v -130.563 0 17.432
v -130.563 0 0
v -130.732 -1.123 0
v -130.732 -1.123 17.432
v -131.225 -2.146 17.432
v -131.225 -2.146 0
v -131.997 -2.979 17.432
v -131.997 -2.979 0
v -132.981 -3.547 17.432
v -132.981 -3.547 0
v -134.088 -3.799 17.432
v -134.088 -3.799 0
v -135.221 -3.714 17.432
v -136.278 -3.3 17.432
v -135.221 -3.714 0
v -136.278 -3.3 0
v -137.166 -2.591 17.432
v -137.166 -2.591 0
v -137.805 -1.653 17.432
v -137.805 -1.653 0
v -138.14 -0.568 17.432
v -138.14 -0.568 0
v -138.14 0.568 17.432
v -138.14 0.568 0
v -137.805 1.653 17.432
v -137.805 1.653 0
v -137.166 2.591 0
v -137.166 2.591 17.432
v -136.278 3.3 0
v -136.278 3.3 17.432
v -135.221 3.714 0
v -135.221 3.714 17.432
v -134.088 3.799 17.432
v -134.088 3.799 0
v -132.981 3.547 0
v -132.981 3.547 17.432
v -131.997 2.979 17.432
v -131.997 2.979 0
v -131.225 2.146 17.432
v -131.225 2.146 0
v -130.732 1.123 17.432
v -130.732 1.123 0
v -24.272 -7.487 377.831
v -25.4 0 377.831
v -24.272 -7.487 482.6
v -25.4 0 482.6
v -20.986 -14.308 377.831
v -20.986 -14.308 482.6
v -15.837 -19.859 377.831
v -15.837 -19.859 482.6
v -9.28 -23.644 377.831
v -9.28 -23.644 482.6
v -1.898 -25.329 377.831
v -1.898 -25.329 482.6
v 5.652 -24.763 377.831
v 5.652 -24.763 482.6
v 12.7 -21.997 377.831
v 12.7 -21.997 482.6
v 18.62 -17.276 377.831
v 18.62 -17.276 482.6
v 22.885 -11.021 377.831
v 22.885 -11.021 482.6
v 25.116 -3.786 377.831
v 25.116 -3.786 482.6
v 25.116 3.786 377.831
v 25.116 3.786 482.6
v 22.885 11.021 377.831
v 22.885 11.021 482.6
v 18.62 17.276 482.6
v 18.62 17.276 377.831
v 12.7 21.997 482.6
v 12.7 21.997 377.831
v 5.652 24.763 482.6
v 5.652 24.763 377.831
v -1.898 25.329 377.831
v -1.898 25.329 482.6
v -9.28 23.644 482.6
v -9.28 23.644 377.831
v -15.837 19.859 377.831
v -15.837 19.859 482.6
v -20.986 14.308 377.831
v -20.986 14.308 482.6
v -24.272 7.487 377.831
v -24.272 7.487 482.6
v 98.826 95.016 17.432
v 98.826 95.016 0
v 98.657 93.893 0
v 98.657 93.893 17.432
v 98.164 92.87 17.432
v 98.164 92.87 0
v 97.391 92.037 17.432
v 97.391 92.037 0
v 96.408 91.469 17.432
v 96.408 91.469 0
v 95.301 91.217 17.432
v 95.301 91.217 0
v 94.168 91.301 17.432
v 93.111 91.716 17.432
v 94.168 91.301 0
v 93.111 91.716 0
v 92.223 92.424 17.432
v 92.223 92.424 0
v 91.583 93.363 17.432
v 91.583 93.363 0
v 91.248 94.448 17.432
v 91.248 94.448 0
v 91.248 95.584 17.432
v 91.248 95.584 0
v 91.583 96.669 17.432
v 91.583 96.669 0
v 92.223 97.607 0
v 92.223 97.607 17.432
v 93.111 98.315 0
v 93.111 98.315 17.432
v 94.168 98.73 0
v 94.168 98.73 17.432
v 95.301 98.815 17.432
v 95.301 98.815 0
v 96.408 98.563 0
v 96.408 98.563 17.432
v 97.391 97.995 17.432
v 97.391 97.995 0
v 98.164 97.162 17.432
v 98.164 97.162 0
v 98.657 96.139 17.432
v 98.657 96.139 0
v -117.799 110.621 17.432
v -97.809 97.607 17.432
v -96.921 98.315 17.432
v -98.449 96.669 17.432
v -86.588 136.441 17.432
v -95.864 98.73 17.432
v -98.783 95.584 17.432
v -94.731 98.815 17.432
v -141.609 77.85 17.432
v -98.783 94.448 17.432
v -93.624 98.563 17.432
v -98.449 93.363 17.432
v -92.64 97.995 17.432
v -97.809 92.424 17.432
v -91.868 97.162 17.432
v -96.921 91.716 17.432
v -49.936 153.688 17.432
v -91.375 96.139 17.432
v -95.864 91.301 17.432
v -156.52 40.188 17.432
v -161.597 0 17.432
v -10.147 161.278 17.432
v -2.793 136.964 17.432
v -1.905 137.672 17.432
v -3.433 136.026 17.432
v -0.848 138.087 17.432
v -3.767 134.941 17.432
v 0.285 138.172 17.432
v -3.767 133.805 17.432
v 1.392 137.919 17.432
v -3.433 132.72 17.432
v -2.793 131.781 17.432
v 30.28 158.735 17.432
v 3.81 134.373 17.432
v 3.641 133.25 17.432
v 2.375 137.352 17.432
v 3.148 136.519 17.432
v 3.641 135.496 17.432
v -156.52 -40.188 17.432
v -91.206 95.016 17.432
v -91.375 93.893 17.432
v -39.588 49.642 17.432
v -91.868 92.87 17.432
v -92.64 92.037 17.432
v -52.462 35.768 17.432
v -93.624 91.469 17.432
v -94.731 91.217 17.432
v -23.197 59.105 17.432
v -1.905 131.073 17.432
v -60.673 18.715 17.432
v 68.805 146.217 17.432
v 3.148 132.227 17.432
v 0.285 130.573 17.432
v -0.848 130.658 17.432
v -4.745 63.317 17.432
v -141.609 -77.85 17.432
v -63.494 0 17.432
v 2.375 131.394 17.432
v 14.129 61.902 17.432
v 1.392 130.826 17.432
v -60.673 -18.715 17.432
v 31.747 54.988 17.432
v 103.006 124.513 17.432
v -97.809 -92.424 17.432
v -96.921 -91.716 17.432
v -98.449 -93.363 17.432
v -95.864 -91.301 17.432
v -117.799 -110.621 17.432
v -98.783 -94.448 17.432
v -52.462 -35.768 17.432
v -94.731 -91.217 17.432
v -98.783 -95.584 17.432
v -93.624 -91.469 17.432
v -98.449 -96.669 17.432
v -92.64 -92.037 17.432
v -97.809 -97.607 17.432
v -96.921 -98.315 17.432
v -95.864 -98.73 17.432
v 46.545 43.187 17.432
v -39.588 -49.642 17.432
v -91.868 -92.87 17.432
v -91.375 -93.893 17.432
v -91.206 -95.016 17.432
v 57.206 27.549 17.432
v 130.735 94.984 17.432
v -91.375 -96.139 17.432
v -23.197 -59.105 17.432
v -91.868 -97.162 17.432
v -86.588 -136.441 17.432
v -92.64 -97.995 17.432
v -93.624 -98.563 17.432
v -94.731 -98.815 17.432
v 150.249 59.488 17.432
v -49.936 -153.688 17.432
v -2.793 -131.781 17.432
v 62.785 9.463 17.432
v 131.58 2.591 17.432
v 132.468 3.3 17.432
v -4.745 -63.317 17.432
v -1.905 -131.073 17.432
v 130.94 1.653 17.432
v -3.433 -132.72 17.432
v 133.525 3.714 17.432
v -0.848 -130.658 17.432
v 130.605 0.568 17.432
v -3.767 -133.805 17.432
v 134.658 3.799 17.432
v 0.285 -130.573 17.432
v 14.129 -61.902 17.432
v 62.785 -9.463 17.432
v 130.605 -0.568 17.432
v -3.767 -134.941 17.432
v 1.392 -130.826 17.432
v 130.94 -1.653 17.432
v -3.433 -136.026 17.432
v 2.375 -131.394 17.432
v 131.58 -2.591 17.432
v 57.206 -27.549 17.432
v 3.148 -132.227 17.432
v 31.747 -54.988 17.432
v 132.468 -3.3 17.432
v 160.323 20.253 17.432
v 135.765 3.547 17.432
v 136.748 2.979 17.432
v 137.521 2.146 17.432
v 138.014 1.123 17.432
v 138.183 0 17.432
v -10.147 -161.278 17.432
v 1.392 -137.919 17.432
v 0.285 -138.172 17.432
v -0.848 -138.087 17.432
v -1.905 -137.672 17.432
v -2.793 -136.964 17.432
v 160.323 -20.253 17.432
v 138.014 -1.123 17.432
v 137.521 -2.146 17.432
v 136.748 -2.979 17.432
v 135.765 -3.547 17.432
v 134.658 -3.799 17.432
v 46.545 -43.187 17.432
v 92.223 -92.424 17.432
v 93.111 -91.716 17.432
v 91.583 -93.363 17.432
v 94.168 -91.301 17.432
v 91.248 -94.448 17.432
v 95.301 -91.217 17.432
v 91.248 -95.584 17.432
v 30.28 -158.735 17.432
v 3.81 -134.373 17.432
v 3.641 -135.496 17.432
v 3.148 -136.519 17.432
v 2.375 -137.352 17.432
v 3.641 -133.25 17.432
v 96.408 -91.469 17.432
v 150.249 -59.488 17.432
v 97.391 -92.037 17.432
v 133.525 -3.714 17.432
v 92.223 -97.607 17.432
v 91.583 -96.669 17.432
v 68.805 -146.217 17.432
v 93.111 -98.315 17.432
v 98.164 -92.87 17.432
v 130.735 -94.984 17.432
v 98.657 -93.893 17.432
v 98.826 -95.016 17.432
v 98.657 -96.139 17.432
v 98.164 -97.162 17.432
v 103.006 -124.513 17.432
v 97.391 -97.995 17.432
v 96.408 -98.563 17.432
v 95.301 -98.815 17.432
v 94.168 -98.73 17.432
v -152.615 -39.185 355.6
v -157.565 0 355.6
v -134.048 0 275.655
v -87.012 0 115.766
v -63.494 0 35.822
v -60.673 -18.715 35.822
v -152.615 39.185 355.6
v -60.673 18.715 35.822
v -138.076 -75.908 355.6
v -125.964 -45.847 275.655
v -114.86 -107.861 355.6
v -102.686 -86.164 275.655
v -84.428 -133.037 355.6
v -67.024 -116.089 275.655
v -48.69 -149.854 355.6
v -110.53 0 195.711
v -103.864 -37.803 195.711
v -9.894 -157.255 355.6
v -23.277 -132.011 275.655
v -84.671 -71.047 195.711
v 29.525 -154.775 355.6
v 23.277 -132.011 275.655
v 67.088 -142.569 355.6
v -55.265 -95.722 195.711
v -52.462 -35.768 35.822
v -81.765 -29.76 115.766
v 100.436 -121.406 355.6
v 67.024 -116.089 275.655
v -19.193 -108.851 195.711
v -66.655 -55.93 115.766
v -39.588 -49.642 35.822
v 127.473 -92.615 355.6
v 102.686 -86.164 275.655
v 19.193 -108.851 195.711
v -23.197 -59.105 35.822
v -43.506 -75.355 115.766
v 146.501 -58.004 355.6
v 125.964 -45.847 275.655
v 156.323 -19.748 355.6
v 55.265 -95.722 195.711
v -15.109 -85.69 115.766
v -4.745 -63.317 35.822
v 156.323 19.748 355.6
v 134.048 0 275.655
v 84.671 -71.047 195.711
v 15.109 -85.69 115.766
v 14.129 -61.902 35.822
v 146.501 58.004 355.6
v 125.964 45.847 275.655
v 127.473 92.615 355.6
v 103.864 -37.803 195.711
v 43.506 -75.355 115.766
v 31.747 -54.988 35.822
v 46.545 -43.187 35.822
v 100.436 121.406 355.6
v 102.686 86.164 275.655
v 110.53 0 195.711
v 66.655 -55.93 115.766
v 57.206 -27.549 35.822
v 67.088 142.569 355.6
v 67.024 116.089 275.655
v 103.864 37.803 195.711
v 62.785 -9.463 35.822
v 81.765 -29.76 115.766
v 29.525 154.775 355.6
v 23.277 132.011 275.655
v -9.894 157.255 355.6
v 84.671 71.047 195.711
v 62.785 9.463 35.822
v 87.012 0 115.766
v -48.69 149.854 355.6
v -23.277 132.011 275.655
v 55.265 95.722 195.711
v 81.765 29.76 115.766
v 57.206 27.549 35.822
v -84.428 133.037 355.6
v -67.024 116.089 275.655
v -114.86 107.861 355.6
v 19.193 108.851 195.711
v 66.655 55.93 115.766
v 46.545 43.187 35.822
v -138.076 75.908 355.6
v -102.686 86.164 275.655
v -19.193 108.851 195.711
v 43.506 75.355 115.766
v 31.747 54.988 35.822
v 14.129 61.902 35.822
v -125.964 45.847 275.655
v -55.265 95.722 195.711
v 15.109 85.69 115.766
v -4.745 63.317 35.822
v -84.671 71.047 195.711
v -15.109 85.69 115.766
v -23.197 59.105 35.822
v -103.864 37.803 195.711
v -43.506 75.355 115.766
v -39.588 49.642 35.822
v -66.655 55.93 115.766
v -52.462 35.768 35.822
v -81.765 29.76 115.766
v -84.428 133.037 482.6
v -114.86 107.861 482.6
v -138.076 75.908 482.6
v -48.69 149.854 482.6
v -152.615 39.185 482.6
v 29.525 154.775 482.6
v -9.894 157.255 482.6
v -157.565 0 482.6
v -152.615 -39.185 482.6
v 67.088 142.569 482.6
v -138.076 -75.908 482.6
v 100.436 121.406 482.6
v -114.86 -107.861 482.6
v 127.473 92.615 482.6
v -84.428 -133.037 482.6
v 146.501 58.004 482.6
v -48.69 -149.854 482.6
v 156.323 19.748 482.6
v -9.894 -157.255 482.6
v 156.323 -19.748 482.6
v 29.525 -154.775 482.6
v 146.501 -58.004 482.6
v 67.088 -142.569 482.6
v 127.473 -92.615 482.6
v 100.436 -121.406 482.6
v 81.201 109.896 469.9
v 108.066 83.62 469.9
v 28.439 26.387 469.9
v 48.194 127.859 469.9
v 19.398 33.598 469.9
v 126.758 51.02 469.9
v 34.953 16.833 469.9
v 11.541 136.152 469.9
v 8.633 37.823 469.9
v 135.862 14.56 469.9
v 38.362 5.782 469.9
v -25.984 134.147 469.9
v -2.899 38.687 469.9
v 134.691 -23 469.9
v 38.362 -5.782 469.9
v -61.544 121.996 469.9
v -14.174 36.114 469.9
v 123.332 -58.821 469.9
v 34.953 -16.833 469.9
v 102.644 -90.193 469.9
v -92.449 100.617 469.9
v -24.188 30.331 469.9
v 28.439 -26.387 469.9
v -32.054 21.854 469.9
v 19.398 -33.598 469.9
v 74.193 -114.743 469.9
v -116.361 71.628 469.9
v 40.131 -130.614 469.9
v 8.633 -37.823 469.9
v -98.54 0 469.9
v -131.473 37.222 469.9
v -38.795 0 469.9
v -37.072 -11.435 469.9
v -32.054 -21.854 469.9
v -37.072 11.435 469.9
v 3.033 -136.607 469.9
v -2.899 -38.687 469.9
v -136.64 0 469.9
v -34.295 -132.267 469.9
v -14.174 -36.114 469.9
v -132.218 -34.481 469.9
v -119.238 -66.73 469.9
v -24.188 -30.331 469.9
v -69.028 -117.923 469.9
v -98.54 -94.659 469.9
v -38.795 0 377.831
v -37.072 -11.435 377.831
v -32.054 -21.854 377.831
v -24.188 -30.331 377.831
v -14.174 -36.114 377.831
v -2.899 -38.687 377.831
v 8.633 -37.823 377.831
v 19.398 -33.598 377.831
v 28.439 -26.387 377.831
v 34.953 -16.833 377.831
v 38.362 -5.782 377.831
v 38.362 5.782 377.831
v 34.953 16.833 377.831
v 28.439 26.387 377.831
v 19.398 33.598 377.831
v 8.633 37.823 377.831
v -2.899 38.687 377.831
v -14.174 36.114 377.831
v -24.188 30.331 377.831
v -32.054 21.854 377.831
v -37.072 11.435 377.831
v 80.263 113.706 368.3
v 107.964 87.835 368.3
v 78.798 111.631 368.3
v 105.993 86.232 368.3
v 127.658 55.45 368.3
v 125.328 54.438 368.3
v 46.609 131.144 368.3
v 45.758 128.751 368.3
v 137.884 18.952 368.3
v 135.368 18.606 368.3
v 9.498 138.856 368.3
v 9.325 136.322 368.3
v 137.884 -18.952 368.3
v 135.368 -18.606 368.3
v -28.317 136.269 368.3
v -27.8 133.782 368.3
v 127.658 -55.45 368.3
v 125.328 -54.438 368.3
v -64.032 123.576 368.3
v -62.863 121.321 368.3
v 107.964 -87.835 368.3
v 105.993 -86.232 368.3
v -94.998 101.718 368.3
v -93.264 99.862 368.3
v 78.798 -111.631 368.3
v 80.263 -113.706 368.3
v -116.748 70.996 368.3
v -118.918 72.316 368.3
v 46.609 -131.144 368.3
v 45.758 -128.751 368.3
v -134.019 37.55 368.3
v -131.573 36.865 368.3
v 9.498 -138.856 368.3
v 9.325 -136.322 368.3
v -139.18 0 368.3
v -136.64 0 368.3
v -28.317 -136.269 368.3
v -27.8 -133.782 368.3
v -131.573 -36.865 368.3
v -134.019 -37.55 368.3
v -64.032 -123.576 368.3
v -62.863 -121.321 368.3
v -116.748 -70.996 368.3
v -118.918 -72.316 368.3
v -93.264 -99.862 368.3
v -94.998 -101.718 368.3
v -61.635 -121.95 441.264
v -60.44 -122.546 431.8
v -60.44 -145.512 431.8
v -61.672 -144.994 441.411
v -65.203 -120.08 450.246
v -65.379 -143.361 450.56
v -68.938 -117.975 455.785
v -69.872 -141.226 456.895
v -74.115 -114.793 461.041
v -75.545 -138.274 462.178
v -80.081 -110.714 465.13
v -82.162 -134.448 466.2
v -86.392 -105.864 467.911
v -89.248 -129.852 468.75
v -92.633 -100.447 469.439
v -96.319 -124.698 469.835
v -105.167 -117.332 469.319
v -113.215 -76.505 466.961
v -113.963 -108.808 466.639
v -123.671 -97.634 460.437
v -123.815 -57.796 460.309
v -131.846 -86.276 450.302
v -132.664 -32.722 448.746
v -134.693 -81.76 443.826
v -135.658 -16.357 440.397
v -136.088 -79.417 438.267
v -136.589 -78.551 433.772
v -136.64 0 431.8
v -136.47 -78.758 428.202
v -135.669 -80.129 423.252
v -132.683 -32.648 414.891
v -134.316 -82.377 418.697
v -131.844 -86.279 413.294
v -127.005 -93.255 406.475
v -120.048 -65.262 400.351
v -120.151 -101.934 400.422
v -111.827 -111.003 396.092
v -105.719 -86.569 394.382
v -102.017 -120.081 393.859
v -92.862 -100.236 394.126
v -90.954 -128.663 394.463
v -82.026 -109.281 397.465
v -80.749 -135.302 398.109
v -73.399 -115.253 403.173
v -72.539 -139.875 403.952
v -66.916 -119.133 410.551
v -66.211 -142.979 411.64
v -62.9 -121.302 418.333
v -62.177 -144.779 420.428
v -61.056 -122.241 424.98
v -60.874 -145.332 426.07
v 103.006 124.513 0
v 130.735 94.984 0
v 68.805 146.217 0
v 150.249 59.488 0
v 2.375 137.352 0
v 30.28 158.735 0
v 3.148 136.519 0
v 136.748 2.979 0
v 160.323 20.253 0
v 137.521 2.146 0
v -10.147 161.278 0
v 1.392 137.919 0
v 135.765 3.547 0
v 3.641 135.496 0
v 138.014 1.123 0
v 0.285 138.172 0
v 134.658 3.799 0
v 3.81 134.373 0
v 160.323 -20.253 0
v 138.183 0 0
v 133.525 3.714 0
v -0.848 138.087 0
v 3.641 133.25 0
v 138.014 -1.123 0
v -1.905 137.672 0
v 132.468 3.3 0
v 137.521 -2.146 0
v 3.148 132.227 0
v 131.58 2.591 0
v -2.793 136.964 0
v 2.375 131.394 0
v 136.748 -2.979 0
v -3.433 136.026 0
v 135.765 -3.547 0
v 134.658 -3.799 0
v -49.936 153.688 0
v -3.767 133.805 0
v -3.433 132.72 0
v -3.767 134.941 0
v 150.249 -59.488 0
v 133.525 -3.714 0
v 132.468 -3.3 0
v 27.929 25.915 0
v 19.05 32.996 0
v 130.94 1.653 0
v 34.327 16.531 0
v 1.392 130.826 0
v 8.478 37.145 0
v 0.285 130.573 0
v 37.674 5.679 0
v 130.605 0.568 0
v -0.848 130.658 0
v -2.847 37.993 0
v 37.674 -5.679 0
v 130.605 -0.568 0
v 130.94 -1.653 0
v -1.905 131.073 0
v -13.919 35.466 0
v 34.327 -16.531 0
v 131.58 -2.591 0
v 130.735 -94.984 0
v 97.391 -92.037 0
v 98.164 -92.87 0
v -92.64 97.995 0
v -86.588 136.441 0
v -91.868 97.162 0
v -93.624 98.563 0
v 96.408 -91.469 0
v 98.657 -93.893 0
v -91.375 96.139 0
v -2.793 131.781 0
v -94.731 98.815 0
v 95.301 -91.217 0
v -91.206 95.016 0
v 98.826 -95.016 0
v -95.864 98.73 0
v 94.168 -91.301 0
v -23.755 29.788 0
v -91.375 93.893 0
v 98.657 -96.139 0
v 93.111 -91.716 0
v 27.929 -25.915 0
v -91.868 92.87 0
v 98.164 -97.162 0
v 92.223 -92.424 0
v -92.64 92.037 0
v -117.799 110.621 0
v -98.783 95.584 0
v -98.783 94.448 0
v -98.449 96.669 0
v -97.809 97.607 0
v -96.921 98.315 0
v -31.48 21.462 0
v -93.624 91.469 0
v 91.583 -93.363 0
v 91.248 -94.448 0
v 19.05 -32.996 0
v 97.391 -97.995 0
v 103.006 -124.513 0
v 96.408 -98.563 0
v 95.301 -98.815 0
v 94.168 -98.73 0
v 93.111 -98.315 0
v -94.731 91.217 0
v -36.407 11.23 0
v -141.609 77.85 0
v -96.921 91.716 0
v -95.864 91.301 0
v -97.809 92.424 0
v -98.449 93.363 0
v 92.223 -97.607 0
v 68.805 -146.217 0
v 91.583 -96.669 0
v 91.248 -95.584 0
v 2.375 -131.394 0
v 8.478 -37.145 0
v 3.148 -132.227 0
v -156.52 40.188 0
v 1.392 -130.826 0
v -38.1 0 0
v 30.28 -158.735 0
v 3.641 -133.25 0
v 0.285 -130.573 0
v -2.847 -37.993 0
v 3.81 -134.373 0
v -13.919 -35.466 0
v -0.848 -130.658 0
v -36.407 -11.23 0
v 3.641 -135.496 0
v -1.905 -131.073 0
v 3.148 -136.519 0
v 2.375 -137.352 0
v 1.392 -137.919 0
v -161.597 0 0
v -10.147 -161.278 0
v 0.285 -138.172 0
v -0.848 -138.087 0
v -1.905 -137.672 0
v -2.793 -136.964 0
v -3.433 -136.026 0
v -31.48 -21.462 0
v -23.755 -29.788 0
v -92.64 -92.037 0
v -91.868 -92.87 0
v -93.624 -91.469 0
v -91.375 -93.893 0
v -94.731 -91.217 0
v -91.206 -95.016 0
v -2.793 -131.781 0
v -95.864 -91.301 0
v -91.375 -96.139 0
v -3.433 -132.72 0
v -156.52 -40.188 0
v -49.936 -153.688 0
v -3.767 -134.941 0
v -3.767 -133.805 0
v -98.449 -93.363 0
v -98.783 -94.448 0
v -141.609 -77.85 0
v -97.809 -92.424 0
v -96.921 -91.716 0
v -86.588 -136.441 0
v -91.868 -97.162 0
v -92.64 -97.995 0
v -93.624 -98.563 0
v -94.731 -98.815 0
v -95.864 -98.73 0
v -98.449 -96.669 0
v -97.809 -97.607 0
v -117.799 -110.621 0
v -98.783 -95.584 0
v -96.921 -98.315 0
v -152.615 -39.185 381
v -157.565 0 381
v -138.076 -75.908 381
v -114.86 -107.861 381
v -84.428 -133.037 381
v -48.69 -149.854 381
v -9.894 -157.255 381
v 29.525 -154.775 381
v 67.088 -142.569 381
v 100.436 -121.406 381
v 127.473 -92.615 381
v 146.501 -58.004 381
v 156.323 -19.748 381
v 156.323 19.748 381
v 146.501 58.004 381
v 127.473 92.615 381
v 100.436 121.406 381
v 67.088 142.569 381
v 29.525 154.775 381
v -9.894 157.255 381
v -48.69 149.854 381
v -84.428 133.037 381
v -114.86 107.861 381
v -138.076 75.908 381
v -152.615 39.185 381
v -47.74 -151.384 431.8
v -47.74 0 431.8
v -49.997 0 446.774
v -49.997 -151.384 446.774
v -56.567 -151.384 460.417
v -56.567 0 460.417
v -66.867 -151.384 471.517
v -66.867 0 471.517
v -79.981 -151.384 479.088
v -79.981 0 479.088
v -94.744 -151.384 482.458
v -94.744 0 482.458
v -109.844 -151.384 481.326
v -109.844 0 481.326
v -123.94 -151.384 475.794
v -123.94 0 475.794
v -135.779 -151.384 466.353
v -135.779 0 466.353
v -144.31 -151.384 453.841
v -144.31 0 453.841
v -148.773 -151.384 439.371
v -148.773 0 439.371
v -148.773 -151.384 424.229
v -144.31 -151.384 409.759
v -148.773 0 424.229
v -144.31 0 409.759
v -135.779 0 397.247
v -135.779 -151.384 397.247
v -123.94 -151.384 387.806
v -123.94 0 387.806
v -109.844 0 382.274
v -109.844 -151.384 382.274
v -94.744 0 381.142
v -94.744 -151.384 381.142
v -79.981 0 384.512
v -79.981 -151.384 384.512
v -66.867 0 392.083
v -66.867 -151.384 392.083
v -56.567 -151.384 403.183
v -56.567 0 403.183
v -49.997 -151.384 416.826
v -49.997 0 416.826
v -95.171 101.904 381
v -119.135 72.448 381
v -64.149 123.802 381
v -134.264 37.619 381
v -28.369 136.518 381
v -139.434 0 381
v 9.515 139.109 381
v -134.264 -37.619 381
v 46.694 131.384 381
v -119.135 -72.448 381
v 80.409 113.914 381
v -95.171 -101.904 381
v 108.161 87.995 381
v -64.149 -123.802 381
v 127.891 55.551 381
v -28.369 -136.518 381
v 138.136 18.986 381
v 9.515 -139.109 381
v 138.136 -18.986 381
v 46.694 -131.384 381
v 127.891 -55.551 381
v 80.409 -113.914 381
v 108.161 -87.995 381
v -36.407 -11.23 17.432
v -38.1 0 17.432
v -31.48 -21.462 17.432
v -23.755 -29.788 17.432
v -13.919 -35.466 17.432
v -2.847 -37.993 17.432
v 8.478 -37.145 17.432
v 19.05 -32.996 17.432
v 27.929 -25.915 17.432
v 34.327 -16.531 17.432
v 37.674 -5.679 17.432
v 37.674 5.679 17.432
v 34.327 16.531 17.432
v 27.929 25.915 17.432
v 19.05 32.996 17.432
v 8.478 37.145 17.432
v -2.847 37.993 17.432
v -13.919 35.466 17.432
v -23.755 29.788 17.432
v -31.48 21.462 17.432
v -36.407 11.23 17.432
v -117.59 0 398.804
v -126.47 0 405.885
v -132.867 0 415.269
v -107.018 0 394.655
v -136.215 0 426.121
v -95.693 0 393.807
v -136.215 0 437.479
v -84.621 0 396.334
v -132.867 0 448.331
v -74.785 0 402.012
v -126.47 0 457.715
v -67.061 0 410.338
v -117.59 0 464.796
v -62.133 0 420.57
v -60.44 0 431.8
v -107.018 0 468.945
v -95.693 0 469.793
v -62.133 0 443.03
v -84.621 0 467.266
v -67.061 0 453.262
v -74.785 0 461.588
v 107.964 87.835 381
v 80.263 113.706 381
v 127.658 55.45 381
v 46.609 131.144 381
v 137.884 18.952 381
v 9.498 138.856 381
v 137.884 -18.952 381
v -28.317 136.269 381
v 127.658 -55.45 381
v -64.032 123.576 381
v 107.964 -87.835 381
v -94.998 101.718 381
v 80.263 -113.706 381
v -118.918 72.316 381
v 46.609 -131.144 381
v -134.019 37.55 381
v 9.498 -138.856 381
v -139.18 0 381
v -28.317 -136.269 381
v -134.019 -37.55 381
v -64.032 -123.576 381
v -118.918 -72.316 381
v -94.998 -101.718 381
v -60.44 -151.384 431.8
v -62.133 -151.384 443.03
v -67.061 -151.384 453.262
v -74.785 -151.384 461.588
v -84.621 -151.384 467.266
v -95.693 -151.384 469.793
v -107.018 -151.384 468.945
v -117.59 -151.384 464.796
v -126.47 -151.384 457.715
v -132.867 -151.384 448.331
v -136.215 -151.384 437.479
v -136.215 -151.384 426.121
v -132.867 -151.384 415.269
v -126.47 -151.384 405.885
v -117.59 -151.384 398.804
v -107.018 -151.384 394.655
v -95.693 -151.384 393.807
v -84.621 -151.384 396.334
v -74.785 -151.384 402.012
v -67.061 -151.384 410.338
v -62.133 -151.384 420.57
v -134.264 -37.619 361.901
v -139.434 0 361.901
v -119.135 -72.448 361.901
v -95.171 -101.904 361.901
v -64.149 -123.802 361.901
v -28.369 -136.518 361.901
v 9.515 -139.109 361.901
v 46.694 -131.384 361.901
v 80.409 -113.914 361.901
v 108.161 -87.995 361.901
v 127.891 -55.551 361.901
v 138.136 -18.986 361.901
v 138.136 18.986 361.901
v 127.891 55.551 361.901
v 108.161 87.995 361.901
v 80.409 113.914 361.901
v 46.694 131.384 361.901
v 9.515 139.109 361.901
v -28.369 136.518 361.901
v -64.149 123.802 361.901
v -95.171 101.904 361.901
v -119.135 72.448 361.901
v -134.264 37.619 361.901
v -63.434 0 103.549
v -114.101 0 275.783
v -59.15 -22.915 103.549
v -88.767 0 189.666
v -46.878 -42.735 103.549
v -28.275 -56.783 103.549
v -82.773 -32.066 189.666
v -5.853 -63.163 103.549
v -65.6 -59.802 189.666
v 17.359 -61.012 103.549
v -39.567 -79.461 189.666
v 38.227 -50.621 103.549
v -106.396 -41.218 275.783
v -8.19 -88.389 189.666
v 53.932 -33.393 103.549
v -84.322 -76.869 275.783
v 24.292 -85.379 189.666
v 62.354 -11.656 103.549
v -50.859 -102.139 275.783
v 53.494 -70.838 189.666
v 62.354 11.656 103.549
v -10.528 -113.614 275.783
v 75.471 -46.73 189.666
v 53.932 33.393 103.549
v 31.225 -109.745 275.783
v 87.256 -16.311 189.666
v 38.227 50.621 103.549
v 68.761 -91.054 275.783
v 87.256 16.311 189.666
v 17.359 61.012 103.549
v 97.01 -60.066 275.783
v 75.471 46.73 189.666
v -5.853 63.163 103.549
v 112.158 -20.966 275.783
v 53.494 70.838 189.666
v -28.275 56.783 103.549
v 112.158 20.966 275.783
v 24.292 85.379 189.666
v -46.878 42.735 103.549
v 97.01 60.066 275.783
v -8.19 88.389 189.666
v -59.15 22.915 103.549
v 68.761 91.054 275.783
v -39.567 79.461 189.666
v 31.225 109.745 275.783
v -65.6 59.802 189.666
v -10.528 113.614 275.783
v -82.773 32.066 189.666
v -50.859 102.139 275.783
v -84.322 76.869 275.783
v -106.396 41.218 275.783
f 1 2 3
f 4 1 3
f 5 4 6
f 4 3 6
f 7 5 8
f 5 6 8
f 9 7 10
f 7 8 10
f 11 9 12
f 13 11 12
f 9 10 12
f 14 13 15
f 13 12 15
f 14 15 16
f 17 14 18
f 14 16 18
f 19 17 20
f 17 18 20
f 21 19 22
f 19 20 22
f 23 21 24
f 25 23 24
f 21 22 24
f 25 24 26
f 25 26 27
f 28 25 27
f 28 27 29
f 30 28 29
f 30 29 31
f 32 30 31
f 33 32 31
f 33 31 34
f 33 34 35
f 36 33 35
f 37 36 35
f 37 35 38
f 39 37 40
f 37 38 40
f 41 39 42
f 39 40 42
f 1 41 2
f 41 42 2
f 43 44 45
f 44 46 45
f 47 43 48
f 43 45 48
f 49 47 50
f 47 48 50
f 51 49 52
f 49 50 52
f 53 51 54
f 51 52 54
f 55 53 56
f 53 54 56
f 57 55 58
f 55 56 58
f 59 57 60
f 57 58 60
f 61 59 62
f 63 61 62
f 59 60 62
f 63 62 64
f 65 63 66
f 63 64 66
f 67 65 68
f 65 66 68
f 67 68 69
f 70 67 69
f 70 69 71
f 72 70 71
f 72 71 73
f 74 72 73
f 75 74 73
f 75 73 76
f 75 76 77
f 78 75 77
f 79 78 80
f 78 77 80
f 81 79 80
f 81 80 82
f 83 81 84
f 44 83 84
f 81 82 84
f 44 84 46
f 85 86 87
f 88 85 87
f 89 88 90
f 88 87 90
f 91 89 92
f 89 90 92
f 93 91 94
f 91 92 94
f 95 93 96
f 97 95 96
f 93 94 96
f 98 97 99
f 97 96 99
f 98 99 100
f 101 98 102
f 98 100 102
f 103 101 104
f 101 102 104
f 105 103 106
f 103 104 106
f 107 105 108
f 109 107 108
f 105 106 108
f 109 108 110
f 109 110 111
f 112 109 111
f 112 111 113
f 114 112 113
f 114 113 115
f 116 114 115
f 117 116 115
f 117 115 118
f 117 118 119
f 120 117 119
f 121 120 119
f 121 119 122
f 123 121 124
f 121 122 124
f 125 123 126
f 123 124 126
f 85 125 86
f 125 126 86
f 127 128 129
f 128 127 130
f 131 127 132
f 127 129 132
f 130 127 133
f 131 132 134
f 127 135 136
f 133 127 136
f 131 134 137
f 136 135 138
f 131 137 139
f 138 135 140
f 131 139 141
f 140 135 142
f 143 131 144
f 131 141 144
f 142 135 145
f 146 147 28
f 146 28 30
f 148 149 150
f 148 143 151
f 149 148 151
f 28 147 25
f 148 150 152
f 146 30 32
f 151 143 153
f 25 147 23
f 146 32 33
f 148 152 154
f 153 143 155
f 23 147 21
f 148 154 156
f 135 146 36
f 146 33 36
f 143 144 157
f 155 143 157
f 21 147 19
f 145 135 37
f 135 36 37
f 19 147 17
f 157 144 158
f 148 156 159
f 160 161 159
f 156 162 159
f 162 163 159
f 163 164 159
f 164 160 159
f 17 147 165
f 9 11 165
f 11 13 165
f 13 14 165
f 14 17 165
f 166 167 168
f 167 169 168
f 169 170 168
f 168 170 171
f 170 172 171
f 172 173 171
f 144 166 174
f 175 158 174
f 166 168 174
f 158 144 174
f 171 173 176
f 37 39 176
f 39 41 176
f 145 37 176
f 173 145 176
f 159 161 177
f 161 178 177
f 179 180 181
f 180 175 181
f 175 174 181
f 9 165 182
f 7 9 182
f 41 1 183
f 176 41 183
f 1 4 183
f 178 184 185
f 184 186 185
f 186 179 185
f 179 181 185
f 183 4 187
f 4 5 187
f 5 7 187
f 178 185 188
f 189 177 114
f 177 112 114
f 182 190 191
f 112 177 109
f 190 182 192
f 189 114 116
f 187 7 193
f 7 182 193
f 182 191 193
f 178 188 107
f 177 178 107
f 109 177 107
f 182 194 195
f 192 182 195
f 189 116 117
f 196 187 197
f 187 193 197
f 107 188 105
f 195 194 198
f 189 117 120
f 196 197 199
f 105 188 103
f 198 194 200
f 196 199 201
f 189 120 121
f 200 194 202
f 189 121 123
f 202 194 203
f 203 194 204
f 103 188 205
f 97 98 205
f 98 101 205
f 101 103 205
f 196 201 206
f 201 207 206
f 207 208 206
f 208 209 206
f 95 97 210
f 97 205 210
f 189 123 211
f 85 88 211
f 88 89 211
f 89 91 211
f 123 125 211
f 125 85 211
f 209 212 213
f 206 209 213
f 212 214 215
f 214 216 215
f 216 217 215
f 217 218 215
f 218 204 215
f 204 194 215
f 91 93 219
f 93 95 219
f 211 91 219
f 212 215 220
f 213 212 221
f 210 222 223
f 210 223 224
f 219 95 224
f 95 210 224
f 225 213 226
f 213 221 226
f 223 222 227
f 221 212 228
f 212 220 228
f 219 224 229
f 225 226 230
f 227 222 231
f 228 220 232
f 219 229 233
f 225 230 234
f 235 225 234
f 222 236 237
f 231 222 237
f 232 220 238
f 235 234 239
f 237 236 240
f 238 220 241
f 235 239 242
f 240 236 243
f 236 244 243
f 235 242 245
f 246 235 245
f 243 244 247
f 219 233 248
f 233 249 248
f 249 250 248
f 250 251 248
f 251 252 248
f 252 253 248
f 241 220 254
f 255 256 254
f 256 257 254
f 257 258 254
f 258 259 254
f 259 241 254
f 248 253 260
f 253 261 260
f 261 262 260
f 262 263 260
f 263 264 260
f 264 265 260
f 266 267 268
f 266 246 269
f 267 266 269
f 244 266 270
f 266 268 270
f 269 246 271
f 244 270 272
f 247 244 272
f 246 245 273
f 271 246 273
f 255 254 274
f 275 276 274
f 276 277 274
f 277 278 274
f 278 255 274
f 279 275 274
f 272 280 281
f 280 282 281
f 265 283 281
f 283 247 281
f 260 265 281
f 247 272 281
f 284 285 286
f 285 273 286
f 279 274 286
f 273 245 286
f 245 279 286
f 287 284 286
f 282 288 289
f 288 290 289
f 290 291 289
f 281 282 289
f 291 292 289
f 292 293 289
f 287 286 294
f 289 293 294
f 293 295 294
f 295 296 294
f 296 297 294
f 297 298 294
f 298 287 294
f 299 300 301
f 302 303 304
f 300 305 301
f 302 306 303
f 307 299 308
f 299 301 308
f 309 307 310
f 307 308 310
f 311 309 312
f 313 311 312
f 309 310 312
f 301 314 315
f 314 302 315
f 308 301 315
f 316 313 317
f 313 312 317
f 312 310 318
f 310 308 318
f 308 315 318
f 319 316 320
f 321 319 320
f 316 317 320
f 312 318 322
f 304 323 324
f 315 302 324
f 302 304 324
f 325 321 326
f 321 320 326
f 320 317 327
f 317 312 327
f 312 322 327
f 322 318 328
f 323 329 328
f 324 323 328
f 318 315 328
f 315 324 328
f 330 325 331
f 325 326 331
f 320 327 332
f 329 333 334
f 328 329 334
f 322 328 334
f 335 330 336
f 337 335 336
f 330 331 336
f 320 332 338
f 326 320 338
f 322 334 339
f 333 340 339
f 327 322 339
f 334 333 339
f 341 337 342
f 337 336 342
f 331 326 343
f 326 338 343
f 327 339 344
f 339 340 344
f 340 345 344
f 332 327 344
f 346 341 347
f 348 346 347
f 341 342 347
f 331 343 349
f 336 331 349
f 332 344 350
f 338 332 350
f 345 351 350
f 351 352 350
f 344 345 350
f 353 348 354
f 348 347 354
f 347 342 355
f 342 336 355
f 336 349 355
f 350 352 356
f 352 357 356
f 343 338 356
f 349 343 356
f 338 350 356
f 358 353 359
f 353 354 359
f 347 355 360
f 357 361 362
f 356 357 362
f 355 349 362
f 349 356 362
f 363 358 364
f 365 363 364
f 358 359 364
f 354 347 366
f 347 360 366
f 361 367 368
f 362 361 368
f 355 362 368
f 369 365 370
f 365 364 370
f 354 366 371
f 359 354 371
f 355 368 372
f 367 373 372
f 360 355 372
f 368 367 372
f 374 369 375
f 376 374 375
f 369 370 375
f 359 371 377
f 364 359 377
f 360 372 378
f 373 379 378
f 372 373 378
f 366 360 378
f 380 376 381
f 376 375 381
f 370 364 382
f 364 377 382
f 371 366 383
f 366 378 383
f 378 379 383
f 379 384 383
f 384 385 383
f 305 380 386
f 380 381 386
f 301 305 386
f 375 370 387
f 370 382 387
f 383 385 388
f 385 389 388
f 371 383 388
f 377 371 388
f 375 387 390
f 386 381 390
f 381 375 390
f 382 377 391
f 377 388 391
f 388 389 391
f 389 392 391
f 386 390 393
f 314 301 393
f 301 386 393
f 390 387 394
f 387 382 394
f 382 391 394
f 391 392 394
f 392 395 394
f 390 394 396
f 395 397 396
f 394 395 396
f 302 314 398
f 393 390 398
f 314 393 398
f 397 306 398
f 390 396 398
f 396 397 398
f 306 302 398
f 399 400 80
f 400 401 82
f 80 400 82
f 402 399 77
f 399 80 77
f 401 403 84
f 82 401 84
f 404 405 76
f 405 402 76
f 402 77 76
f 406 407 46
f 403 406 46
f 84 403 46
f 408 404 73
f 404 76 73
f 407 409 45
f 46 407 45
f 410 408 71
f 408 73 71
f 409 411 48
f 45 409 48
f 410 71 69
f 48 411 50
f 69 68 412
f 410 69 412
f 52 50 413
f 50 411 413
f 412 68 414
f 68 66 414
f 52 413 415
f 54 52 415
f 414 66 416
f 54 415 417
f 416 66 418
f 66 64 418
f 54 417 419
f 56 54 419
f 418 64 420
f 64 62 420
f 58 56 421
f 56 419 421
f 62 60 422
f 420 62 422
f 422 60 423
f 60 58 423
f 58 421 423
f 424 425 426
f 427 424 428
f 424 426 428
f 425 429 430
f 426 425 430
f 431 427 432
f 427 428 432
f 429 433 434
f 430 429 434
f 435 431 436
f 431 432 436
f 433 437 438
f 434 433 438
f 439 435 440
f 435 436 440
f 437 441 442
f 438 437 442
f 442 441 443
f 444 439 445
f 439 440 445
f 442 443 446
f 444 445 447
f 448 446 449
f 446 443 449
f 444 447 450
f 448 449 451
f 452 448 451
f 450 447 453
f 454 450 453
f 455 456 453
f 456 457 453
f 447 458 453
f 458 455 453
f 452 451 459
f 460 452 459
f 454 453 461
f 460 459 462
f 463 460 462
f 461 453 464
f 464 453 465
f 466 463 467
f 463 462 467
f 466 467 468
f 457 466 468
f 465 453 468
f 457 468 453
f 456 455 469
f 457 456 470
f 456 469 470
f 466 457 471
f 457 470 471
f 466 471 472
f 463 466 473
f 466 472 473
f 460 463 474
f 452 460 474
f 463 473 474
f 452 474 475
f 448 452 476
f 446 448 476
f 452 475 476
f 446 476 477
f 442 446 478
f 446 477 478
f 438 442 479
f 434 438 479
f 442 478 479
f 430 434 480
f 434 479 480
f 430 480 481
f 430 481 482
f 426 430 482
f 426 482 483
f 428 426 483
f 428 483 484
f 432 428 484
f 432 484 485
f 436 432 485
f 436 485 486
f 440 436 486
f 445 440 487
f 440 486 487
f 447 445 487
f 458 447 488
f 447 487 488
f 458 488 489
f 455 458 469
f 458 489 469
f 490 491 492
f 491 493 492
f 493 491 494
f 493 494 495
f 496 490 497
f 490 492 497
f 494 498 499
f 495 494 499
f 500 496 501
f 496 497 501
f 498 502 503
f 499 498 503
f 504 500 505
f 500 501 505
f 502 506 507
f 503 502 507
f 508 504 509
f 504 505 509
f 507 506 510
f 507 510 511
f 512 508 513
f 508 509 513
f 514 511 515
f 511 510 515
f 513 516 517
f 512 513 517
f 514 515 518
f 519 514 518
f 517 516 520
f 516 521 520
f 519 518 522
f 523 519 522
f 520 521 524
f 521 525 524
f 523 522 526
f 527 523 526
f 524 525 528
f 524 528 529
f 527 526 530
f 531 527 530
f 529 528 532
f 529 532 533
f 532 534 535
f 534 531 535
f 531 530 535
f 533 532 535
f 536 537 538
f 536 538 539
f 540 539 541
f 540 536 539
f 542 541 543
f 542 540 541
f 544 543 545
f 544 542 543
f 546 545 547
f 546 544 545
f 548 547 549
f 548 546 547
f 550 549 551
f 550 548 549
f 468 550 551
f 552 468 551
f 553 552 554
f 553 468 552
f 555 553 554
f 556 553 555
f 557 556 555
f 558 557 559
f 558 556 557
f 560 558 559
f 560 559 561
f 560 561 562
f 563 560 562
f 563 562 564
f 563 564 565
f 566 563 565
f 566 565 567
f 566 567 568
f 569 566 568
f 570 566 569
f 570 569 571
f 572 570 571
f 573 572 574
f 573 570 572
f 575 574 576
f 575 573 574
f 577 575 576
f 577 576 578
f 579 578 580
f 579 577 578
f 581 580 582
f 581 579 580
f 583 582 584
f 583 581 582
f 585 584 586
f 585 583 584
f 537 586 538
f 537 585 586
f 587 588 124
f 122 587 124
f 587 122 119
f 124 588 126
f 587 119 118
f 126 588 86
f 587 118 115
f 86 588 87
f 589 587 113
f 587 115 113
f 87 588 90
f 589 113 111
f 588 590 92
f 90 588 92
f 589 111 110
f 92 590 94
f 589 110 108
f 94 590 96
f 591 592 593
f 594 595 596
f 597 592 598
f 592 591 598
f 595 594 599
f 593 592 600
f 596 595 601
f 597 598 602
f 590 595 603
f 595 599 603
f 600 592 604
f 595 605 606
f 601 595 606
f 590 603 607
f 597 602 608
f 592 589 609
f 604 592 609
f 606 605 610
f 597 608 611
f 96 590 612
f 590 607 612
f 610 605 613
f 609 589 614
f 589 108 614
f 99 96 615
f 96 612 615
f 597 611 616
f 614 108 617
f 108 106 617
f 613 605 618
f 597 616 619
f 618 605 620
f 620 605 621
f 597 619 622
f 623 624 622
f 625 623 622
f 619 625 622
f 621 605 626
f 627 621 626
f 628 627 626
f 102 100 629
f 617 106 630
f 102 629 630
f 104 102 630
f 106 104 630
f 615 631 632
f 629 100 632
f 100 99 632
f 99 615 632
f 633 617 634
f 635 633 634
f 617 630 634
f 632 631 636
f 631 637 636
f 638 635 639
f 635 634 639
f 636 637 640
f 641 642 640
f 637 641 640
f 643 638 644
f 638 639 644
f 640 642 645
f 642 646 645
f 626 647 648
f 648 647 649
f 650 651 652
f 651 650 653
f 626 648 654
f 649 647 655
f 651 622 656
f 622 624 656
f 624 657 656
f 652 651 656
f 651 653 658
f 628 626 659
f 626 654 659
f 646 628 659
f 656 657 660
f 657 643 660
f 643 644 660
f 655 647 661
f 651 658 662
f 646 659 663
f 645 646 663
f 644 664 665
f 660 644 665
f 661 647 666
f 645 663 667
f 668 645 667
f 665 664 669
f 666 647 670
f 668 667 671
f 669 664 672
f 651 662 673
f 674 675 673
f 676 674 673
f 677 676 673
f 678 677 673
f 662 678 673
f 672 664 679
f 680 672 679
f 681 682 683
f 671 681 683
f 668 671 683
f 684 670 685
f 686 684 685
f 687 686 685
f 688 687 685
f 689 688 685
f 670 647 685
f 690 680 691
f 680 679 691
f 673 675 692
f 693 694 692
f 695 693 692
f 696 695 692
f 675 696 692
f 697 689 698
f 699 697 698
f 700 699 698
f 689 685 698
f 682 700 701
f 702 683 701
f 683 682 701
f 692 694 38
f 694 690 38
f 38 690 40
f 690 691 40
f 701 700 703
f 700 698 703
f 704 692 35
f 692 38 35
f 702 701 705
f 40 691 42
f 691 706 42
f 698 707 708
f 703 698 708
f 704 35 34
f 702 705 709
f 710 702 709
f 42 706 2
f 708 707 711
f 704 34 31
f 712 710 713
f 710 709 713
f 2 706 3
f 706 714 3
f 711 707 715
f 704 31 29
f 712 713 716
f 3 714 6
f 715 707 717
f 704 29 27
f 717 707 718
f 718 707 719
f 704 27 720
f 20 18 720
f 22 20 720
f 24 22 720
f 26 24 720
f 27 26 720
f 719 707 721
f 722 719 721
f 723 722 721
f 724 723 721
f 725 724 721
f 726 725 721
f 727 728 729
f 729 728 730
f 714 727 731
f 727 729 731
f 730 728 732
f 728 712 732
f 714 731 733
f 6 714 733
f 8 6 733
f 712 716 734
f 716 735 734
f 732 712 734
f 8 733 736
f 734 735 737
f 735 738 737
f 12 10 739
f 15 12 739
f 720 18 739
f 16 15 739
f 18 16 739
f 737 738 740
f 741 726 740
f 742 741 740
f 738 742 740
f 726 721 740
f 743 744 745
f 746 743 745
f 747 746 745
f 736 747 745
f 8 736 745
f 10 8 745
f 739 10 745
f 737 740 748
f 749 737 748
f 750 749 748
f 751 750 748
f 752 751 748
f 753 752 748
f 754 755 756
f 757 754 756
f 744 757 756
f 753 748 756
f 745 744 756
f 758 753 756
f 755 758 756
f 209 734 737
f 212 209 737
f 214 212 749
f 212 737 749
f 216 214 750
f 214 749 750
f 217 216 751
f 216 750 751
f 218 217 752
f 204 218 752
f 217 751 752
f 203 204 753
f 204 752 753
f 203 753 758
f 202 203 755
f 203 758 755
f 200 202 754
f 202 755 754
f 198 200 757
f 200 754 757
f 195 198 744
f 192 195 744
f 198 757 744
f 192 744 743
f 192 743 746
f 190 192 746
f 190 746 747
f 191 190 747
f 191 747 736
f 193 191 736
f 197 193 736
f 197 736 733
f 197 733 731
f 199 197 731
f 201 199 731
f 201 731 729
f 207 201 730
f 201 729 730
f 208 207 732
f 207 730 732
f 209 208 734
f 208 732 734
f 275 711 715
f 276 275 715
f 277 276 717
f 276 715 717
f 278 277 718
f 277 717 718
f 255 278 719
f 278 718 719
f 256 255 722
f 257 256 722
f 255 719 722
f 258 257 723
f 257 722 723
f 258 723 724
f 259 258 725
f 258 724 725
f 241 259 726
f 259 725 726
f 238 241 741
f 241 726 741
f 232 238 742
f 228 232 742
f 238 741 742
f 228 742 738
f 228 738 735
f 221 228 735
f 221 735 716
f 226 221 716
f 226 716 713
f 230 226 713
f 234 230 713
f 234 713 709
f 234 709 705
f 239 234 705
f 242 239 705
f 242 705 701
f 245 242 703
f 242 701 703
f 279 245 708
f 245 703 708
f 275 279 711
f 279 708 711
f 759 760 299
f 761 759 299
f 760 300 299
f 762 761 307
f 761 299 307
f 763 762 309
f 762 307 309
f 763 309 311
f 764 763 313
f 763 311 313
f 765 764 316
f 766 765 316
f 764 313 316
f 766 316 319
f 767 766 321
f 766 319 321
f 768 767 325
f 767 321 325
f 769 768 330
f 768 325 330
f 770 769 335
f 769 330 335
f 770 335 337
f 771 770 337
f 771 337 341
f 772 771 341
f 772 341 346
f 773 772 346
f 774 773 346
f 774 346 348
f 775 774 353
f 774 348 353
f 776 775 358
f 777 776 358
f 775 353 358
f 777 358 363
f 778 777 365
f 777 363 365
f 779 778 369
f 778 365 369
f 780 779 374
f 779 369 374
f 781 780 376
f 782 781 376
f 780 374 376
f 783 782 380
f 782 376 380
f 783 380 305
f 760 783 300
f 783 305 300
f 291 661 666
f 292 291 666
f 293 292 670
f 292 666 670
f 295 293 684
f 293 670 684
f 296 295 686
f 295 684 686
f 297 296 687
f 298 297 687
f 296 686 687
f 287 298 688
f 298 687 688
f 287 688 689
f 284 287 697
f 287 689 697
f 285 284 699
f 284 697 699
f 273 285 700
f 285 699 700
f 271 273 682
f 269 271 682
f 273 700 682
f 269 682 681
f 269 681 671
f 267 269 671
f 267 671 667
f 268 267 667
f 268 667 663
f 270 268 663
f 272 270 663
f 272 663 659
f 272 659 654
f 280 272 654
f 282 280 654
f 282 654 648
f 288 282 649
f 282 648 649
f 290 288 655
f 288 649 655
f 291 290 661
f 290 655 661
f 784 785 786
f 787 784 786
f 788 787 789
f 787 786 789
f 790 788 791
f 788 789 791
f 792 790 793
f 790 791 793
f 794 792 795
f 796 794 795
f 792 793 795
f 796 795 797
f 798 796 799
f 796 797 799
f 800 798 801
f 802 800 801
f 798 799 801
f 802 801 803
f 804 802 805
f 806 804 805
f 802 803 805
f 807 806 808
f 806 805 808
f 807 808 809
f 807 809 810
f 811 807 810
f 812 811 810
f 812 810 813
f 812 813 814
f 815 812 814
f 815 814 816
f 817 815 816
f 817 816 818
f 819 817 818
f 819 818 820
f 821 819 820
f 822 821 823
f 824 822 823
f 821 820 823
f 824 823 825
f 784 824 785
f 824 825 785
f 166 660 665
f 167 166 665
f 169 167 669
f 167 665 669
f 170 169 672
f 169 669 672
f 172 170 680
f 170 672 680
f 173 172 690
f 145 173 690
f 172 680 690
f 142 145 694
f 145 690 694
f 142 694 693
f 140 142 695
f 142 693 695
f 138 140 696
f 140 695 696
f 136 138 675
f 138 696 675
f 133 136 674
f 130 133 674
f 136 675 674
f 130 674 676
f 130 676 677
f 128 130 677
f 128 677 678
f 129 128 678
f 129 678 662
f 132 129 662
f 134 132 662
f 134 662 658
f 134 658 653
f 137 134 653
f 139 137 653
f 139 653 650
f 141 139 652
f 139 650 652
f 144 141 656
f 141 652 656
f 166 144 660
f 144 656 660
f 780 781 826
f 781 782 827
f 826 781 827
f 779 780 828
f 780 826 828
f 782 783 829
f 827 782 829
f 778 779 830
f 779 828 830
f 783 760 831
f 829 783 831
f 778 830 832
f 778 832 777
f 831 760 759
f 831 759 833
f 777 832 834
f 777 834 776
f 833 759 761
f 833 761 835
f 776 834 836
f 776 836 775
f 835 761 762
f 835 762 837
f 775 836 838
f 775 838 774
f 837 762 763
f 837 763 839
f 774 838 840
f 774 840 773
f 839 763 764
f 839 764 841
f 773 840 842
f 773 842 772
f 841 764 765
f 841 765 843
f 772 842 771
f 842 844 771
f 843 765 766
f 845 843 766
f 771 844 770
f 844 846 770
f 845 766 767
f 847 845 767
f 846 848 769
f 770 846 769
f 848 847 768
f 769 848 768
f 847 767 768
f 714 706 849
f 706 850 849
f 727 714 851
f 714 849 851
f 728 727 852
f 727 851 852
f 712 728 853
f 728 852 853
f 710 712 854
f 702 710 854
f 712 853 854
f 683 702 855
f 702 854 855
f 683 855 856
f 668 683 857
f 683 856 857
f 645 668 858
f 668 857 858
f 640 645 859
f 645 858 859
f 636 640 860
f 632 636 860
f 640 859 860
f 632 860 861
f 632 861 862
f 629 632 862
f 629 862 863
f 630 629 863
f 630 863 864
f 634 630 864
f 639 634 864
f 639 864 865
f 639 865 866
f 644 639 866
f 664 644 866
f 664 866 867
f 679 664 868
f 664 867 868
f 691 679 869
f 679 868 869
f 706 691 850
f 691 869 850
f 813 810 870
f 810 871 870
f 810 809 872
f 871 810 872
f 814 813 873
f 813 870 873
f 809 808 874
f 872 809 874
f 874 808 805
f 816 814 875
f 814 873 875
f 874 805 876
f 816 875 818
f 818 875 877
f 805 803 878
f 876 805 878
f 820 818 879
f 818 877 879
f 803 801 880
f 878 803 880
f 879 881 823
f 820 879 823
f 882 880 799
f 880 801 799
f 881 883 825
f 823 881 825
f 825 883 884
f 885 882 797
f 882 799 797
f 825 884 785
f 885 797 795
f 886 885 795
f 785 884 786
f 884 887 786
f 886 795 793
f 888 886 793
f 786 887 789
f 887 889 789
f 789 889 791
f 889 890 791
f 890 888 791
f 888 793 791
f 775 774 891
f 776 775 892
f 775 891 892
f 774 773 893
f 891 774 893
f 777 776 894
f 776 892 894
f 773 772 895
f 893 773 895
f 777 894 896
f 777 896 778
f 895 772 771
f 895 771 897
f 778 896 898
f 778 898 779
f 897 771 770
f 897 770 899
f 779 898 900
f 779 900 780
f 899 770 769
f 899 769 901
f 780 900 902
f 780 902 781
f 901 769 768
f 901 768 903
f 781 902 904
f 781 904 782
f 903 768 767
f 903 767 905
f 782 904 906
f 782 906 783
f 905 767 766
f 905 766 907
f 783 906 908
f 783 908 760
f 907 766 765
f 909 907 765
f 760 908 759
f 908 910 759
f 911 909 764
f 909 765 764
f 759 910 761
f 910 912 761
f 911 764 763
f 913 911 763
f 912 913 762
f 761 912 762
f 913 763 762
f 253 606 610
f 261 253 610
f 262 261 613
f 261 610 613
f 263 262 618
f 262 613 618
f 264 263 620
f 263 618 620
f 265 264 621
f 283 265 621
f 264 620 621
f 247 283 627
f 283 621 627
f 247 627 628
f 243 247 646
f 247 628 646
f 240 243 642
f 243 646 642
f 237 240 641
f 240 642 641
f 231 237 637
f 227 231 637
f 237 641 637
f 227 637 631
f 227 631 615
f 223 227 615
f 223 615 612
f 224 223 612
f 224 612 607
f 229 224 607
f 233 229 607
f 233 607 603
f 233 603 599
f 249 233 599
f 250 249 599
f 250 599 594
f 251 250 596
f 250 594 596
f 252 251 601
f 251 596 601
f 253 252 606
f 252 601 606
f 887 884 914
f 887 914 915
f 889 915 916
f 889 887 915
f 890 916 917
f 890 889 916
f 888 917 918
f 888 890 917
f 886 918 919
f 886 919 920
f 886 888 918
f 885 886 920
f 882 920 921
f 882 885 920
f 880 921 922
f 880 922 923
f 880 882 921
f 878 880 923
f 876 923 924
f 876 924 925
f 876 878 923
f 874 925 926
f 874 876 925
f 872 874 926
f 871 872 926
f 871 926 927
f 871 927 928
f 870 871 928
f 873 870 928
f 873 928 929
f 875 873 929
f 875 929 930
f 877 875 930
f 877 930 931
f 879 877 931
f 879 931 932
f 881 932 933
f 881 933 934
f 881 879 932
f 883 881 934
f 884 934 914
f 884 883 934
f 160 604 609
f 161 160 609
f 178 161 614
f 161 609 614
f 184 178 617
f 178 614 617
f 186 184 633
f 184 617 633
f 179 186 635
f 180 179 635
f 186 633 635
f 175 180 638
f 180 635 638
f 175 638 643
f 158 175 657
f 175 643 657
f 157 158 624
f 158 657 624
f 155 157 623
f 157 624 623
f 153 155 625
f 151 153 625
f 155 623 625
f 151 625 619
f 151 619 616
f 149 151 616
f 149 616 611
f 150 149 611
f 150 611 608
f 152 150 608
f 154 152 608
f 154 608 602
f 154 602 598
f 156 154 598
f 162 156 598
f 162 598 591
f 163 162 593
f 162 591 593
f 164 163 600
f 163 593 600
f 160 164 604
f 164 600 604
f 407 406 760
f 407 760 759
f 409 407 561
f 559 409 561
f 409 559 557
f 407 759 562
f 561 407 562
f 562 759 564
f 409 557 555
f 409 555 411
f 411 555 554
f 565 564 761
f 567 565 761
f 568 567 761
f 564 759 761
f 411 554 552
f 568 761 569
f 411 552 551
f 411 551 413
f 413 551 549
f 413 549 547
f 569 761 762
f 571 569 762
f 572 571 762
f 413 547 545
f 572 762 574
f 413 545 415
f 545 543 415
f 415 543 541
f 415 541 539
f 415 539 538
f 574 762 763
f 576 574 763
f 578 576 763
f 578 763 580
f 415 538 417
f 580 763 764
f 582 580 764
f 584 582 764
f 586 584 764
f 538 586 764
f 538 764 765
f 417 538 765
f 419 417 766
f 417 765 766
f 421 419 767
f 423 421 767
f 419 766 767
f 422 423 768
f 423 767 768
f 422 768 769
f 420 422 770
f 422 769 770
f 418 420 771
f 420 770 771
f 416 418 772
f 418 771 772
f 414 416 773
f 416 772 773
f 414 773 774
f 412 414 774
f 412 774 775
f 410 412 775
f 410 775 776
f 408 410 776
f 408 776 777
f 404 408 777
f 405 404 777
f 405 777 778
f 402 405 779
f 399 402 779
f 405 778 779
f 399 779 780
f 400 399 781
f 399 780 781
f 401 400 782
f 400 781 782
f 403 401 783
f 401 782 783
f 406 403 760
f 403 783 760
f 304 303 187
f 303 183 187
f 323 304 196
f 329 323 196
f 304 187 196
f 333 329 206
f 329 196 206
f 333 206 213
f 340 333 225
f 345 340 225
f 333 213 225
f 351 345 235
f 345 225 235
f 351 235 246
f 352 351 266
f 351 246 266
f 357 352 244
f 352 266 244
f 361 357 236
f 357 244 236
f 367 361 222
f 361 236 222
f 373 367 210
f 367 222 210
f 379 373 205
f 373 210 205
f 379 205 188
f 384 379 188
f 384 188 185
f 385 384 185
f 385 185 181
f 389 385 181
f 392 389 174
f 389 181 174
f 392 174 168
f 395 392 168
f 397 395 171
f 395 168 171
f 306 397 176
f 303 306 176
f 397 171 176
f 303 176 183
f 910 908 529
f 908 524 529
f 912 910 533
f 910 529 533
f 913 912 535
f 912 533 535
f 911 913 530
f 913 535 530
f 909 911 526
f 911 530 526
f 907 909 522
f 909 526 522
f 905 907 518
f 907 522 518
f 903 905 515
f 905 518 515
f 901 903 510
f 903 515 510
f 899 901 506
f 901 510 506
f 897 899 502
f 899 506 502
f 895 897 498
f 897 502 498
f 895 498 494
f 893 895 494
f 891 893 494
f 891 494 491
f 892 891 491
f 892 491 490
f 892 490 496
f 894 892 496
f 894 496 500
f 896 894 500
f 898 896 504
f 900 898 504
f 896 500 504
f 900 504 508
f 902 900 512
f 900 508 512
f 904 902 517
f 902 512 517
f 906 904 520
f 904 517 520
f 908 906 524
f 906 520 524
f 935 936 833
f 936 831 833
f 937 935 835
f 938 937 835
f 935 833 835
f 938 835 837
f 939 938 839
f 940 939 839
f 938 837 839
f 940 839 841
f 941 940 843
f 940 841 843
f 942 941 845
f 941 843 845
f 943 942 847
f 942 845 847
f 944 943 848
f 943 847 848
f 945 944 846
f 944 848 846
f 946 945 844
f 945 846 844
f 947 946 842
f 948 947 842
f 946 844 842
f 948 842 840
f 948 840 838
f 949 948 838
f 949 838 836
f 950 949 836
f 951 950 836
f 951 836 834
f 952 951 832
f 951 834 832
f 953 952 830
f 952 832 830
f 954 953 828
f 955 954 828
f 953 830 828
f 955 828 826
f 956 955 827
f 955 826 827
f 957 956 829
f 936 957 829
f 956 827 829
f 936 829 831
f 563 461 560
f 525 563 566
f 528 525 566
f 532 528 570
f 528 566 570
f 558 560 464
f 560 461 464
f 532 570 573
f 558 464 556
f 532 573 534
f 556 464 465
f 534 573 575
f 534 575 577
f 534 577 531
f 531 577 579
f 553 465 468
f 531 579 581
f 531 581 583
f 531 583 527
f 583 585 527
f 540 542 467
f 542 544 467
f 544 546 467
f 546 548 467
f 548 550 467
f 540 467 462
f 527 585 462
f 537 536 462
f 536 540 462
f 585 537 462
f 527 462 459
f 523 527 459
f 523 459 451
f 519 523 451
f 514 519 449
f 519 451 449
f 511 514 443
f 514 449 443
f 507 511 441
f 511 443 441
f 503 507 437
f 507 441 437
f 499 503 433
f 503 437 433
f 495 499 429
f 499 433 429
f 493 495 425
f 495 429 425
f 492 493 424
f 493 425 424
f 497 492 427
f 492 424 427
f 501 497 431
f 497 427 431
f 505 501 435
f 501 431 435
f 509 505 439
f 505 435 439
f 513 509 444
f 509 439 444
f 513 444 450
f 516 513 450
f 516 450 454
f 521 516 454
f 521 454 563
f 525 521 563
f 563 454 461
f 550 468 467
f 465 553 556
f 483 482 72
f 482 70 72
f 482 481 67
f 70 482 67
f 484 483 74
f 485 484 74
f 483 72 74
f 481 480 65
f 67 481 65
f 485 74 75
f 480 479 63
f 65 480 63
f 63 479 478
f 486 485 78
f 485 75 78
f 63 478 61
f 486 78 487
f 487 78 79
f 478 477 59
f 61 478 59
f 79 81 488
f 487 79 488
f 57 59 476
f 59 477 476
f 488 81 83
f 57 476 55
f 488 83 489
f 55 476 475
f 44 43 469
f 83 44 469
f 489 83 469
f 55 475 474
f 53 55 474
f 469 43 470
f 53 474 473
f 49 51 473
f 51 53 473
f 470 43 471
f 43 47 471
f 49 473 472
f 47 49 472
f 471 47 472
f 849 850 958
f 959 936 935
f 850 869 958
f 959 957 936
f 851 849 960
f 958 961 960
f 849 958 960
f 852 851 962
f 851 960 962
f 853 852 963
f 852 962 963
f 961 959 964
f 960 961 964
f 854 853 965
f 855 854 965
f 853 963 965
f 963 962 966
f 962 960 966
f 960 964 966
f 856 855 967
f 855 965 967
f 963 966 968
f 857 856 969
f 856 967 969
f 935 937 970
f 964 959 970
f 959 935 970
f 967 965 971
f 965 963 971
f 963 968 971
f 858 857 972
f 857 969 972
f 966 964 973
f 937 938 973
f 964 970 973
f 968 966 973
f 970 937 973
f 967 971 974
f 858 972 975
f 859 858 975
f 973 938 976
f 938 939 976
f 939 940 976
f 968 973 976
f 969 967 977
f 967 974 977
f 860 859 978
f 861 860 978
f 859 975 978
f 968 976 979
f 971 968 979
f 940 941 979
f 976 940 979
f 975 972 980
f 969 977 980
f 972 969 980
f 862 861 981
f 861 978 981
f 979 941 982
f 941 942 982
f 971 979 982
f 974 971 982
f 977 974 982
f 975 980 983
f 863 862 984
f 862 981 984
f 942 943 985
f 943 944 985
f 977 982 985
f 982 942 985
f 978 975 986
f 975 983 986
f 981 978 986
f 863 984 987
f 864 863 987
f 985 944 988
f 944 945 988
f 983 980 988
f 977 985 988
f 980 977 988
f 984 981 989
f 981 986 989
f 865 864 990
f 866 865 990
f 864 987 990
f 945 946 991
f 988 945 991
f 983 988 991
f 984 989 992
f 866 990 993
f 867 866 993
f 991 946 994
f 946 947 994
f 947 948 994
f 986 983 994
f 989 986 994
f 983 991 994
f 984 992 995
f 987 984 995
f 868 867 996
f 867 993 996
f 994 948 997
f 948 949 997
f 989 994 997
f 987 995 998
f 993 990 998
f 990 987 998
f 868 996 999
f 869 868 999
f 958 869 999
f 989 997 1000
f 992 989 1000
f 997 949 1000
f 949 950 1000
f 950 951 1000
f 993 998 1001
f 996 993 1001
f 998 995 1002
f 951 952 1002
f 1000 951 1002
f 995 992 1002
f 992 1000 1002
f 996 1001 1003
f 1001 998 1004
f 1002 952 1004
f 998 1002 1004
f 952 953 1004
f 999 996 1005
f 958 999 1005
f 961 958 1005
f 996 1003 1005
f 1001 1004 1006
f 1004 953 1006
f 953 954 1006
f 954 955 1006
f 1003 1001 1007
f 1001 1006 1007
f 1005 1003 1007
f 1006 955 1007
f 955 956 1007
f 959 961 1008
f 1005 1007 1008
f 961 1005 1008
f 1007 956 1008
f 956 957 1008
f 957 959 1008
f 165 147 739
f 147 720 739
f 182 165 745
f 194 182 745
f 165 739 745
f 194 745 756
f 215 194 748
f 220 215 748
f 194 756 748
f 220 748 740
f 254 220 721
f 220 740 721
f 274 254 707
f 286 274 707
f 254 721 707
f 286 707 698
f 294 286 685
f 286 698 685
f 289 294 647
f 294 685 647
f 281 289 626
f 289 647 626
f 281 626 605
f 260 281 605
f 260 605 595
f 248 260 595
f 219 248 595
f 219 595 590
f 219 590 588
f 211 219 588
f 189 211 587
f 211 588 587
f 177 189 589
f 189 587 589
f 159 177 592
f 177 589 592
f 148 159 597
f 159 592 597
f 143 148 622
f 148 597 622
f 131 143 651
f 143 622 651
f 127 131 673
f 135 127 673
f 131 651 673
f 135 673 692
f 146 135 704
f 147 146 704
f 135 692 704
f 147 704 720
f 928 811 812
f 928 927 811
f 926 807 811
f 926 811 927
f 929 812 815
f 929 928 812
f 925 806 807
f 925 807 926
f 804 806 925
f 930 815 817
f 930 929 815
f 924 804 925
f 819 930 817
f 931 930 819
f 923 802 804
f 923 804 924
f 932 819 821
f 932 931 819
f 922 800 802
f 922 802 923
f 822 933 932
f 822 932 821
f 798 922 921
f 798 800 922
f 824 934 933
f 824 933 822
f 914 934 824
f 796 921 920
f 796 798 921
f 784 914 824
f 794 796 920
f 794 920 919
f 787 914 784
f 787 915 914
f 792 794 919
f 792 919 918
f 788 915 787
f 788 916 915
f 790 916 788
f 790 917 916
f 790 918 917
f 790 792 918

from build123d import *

# Parameters (mm, degrees)
F2_R     = 3.81
F3_DEPTH = 17.4318458885
F6_R     = 50.8
F6_R_2   = 38.1
F7_DEPTH = 151.384
F8_R     = 38.1
F9_DEPTH = 150.876


with BuildPart() as f1:
    # F0 (on Front) → F1 (revolve)
    with BuildSketch(Plane.XZ):
        Polygon((-161.5971028805, 0), (-38.1, 0), (-38.1, 17.4318458885), (-139.4343958063, 361.9006321764), (-139.4343958063, 381), (-157.5654367864, 381), (-157.5654367864, 355.6), (-63.4943762833, 35.8216682846), (-63.4943762833, 17.4318458885), (-161.5971028805, 17.4318458885), align=None)
    revolve(axis=Axis((0, 0, 239.9535179138), (0, 0, 1)))

    # F2 (on face) → F3 (cut, through all)
    with BuildSketch(Plane(origin=(0, 0, 0), x_dir=(1, 0, 0), z_dir=(0, 0, -1))):
        with Locations((95.015916754, -95.015916754)):
            Circle(F2_R)
        with Locations((0, -134.3727981148)):
            Circle(F2_R)
        with Locations((-95.015916754, -95.015916754)):
            Circle(F2_R)
        with Locations((-134.3727981148, 0)):
            Circle(F2_R)
        with Locations((-95.015916754, 95.015916754)):
            Circle(F2_R)
        with Locations((0, 134.3727981148)):
            Circle(F2_R)
        with Locations((134.3727981148, 0)):
            Circle(F2_R)
        with Locations((95.015916754, 95.015916754)):
            Circle(F2_R)
    extrude(amount=-F3_DEPTH, mode=Mode.SUBTRACT)


with BuildPart() as f5:
    # F4 (on Front) → F5 (revolve)
    with BuildSketch(Plane.XZ):
        Polygon((-139.1803958063, 381), (-139.1803958063, 368.3), (-136.6403958063, 368.3), (-136.6403958063, 469.9), (-38.795273751, 469.9), (-38.795273751, 377.8312887669), (-25.4, 377.8312887669), (-25.4, 482.6), (-38.795273751, 482.6), (-157.5654367864, 482.6), (-157.5654367864, 469.9), (-157.5654367864, 381), align=None)
    revolve(axis=Axis((0, 0, 239.9535179138), (0, 0, 1)))

    # F8 (on Front) → F9 (cut)
    with BuildSketch(Plane.XZ):
        with Locations((-98.5403958063, 431.8)):
            Circle(F8_R)
    extrude(amount=F9_DEPTH, mode=Mode.SUBTRACT)


with BuildPart() as f7:
    # F6 (on Front) → F7 (new body)
    with BuildSketch(Plane.XZ):
        with Locations((-98.5403958063, 431.8)):
            Circle(F6_R)
        with Locations((-98.5403958063, 431.8)):
            Circle(F6_R_2, mode=Mode.SUBTRACT)
    extrude(amount=F7_DEPTH)


solid = Compound([f1.part, f5.part, f7.part])
